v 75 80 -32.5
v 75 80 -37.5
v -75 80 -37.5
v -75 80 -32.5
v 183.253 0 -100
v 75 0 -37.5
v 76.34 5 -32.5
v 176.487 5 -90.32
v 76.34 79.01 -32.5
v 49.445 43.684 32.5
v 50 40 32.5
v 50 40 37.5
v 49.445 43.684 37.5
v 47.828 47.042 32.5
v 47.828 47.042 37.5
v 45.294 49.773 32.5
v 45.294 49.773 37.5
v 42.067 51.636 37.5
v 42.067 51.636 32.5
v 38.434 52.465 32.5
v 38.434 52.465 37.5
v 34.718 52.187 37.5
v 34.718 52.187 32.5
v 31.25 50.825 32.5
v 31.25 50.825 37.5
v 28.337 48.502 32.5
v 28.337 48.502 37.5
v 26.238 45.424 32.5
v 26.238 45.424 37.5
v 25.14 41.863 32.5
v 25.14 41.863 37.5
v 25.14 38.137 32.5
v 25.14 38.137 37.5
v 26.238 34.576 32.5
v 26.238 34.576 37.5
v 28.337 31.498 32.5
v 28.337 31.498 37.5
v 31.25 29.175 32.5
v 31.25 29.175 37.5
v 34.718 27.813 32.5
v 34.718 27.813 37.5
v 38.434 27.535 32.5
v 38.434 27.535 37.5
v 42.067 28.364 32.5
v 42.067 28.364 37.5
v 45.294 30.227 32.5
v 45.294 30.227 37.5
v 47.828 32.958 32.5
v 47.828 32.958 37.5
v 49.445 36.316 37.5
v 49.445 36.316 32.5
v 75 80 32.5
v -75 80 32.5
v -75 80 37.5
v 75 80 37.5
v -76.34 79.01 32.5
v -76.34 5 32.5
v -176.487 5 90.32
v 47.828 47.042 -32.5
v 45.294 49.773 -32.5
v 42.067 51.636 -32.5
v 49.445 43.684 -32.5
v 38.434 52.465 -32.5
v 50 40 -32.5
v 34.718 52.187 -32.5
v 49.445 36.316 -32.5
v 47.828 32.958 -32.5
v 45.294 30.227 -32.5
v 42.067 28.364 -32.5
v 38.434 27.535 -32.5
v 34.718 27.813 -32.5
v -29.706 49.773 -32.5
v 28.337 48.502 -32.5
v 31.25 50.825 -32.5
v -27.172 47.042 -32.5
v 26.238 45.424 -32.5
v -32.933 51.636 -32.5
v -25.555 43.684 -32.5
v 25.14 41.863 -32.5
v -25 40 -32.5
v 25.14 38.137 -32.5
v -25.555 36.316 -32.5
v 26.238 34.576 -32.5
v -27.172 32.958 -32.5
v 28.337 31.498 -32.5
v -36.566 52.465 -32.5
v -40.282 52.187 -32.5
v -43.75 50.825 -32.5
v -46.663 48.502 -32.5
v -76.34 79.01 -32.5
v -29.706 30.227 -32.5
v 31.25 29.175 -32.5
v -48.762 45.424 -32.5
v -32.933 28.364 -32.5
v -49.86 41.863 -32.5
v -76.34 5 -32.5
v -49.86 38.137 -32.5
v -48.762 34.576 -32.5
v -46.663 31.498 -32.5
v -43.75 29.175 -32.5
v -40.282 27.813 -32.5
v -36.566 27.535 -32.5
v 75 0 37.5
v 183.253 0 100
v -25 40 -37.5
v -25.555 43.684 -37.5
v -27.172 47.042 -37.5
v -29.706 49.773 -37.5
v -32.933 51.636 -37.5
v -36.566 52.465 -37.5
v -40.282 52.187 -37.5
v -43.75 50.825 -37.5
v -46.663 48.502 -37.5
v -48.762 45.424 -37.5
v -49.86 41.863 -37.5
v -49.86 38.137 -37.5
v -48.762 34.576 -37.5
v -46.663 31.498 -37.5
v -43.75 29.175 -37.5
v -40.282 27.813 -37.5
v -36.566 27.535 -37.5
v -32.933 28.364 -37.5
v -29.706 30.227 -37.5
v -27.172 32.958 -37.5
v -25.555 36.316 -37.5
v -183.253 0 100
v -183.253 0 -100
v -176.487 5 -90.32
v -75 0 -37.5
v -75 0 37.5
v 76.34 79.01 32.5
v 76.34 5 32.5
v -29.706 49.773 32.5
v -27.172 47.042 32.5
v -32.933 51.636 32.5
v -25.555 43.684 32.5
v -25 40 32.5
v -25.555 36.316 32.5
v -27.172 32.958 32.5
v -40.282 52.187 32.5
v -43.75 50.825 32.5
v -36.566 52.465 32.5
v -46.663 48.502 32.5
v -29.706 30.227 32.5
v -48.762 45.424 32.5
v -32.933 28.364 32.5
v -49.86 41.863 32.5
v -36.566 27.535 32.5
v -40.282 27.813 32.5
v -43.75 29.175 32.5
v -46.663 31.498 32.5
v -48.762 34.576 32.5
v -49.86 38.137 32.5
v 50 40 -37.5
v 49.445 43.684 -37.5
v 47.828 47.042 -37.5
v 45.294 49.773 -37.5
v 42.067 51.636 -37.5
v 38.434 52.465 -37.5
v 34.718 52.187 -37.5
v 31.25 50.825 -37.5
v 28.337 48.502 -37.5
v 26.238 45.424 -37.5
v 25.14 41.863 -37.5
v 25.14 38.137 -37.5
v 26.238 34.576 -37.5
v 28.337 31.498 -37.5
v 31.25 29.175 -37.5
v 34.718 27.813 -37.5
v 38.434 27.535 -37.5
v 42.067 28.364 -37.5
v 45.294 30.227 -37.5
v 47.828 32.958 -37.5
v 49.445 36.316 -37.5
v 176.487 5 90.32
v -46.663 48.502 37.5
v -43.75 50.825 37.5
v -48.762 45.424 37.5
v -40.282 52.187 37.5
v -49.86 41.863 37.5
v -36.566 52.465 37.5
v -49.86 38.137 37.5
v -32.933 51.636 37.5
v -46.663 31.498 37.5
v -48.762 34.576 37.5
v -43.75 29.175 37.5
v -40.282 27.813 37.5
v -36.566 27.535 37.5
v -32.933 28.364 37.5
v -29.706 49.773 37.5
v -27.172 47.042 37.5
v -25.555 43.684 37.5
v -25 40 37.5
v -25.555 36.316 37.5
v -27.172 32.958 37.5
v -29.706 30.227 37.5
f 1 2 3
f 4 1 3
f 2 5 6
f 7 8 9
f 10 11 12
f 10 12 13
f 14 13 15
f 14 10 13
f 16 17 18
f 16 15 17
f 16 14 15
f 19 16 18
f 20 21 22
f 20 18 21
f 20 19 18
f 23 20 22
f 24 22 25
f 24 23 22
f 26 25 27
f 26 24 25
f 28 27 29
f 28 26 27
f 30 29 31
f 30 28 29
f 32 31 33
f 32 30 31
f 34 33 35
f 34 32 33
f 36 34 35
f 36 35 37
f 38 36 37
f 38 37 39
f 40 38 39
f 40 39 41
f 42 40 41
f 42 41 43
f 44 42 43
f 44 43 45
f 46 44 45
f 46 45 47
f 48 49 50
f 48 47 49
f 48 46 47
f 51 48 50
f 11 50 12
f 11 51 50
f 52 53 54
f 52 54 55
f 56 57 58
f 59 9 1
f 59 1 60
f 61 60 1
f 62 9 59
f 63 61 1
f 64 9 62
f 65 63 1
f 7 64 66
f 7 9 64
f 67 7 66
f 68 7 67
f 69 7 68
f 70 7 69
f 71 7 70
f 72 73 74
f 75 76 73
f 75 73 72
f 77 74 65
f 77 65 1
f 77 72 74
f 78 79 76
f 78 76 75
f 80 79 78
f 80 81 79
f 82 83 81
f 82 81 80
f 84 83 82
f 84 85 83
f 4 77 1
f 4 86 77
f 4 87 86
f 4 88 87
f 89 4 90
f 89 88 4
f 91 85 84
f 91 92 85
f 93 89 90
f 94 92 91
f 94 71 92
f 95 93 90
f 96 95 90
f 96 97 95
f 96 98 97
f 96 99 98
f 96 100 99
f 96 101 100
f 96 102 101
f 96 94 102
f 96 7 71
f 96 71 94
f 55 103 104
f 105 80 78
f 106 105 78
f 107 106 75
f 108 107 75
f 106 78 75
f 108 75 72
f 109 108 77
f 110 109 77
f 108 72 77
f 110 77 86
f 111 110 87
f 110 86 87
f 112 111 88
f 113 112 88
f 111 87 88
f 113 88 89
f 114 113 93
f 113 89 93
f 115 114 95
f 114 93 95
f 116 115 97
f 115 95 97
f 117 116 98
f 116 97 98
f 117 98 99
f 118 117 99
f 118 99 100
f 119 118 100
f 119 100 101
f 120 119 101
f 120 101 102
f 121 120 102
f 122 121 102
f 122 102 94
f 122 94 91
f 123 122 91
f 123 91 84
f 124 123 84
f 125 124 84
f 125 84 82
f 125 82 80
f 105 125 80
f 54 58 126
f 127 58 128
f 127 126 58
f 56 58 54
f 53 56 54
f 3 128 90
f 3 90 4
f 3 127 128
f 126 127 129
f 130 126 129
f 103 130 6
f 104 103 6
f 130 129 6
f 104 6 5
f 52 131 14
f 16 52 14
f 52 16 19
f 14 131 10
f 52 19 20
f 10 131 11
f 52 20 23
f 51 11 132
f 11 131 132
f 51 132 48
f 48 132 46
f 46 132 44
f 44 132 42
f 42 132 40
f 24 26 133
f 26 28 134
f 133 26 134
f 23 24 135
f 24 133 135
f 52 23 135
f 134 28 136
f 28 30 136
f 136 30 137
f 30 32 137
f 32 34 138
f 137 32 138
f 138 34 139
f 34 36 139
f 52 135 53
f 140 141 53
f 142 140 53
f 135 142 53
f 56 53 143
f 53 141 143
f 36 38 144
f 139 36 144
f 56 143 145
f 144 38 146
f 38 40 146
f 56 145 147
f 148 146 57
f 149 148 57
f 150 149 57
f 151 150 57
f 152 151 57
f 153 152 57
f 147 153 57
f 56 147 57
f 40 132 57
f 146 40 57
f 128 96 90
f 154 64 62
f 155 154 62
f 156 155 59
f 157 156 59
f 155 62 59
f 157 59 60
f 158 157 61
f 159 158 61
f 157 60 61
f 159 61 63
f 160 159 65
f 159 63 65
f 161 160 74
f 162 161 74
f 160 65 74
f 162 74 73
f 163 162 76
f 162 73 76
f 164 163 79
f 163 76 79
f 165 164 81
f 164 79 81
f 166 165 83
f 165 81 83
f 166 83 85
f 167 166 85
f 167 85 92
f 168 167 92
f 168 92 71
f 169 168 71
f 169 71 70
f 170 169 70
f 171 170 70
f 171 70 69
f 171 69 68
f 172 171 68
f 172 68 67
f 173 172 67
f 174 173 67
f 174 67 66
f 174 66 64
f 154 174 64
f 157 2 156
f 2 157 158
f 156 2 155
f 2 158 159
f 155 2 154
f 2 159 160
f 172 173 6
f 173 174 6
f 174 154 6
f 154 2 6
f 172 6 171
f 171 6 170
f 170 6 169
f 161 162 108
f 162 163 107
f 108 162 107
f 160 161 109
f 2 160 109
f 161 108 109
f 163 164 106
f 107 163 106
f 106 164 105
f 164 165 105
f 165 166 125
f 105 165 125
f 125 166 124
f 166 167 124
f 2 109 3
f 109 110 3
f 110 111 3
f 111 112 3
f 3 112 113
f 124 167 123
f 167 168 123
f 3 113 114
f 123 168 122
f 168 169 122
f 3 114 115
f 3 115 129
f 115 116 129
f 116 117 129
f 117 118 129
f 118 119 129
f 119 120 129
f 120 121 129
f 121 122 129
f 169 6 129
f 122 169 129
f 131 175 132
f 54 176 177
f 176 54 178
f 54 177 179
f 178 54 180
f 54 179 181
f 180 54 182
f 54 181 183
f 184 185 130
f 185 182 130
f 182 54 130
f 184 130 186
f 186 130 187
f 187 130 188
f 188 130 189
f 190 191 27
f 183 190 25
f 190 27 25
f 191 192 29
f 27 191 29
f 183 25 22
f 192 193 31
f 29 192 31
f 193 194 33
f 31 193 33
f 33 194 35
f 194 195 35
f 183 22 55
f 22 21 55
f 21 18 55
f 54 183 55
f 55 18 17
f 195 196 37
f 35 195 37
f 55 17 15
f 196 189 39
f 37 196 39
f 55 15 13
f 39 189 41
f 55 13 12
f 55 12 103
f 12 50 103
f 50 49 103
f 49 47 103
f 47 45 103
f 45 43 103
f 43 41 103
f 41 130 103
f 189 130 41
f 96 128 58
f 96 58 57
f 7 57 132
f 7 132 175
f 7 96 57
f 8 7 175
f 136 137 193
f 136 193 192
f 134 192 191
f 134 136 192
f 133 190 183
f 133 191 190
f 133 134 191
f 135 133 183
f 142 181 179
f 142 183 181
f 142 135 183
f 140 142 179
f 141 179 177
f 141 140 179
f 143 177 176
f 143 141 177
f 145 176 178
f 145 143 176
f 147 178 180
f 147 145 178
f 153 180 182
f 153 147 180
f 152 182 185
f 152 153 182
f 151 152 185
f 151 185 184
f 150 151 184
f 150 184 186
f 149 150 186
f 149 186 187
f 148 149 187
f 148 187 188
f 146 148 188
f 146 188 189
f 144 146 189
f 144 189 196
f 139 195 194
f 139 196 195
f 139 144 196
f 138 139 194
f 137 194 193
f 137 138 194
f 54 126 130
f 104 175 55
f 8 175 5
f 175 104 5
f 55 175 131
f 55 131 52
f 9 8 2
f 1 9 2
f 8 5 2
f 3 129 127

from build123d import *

# Parameters (mm, degrees)
BOSS_EXTRUDE1_DEPTH     = 5
BOSS_EXTRUDE2_DEPTH     = 75
CUT_EXTRUDE1_DEPTH      = 101
CUT_EXTRUDE1_DEPTH_BACK = 101
SKETCH4_R               = 12.5
CUT_EXTRUDE2_DEPTH      = 101
CUT_EXTRUDE2_DEPTH_BACK = 101


with BuildPart() as part:
    # Sketch1 → Boss-Extrude1 (new body)
    with BuildSketch(Plane(origin=(0, 0, 0), x_dir=(1, 0, 0), z_dir=(0, 1, 0))):
        Polygon((-183.253175473, 100), (-183.253175473, -100), (-75, -37.5), (75, -37.5), (183.253175473, -100), (183.253175473, 100), (75, 37.5), (-75, 37.5), align=None)
    extrude(amount=BOSS_EXTRUDE1_DEPTH)

    # Sketch2 → Boss-Extrude2 (add)
    with BuildSketch(Plane(origin=(0, 5, 0), x_dir=(1, 0, 0), z_dir=(0, 1, 0))):
        Polygon((-183.253175473, -100), (-75, -37.5), (75, -37.5), (183.253175473, -100), (183.253175473, -94.226497308), (76.339745962, -32.5), (-76.339745962, -32.5), (-183.253175473, -94.226497308), align=None)
        Polygon((-183.253175473, 100), (-75, 37.5), (75, 37.5), (183.253175473, 100), (183.253175473, 94.226497308), (76.339745962, 32.5), (-76.339745962, 32.5), (-183.253175473, 94.226497308), align=None)
    extrude(amount=BOSS_EXTRUDE2_DEPTH)

    # Sketch3 → Cut-Extrude1 (cut, two sides)
    with BuildSketch(Plane.XY) as cut_extrude1_sk:
        Polygon((-183.253175473, 0), (-75, 80), (-183.253175473, 80), align=None)
        Polygon((183.253175473, 0), (75, 80), (183.253175473, 80), align=None)
    extrude(amount=CUT_EXTRUDE1_DEPTH, mode=Mode.SUBTRACT)
    extrude(cut_extrude1_sk.sketch, amount=-CUT_EXTRUDE1_DEPTH_BACK, mode=Mode.SUBTRACT)

    # Sketch4 → Cut-Extrude2 (cut, two sides)
    with BuildSketch(Plane.XY) as cut_extrude2_sk:
        with Locations((-37.5, 40)):
            Circle(SKETCH4_R)
        with Locations((37.5, 40)):
            Circle(SKETCH4_R)
    extrude(amount=CUT_EXTRUDE2_DEPTH, mode=Mode.SUBTRACT)
    extrude(cut_extrude2_sk.sketch, amount=-CUT_EXTRUDE2_DEPTH_BACK, mode=Mode.SUBTRACT)


solid = part.part
